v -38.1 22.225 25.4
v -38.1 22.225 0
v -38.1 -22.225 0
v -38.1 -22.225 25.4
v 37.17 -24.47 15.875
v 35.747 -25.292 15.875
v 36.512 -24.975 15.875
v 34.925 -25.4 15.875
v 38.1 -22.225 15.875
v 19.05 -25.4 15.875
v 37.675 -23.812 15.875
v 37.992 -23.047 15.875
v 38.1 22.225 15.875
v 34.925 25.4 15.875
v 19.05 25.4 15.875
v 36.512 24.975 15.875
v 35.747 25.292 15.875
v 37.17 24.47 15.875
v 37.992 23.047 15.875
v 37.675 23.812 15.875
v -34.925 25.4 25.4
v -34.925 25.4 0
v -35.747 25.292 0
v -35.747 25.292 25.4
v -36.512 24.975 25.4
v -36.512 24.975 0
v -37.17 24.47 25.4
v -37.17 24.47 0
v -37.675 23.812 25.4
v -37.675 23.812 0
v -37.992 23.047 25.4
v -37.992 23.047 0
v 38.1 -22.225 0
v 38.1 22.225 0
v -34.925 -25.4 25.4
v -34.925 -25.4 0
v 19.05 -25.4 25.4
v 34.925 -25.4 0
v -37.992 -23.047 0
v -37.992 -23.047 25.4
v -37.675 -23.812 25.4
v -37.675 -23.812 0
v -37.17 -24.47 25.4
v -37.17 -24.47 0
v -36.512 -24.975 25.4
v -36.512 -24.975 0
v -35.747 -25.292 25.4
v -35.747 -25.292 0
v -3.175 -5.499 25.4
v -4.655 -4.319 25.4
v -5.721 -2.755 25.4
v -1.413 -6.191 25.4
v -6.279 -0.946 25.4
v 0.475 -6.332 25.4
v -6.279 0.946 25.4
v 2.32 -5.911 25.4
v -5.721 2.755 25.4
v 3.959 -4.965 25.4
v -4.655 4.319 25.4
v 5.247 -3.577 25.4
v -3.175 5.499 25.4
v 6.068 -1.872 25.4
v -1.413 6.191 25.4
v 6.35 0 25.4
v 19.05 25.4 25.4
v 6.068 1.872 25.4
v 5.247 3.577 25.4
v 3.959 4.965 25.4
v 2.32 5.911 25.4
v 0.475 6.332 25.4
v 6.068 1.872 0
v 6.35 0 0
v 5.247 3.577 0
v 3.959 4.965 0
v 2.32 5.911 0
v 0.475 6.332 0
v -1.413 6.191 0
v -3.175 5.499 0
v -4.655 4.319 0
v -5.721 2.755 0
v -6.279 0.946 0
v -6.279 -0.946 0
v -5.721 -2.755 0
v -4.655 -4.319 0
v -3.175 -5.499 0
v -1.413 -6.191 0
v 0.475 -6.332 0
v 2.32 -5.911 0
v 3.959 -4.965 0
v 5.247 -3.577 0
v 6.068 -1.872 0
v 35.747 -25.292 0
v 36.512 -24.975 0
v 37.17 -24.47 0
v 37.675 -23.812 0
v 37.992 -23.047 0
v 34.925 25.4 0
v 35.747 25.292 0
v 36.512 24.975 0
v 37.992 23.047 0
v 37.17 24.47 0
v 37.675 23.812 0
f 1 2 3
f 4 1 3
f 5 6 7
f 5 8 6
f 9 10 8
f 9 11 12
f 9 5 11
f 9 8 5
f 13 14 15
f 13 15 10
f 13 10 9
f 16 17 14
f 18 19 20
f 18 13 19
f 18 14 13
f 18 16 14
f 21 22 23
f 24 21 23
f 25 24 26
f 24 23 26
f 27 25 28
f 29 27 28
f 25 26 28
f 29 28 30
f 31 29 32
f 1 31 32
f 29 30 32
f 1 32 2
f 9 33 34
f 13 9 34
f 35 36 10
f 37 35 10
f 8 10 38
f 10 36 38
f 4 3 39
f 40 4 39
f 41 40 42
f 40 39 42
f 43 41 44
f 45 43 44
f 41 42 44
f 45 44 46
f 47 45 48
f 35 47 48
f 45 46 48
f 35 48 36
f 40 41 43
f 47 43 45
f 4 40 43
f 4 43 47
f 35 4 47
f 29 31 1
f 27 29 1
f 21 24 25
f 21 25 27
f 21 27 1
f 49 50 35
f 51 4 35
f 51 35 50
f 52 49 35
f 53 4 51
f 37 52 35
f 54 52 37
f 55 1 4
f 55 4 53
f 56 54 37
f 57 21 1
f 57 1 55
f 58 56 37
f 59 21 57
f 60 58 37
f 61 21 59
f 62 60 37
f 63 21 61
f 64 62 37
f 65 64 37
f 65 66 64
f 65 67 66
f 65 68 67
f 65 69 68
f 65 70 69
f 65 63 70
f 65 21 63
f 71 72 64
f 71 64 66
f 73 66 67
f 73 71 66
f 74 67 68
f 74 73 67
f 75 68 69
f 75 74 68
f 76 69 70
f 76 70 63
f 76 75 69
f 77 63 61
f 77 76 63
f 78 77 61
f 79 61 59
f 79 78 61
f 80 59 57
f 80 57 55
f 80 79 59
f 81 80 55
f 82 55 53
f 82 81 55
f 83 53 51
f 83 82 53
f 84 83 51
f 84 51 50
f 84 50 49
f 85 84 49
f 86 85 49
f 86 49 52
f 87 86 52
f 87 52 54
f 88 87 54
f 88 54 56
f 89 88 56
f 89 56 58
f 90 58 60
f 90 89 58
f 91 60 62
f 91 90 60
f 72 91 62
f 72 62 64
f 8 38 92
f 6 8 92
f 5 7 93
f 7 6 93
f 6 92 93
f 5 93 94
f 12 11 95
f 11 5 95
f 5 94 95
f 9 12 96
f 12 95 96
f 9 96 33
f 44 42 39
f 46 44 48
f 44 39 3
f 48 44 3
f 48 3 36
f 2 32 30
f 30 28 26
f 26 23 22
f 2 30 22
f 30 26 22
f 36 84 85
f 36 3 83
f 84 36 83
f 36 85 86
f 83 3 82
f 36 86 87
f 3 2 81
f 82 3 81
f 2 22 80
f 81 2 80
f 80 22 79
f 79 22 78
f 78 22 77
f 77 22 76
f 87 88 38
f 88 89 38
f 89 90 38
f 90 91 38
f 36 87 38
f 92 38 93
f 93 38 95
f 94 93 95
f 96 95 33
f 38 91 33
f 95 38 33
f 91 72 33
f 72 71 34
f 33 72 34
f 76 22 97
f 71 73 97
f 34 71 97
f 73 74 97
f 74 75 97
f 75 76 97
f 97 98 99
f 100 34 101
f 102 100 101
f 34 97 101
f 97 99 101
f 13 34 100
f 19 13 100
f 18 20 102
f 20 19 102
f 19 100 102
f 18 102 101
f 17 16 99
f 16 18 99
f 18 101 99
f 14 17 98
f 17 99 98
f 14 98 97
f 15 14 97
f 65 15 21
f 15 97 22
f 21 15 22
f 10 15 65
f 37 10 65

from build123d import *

# Parameters (mm, degrees)
F0_R          = 6.35
F1_DEPTH      = 25.4
F2_W          = 19.05
F2_H          = 9.525
F3_DEPTH      = 25.401
F3_DEPTH_BACK = 25.401


with BuildPart() as f1:
    # F0 (on Top) → F1 (new body)
    with BuildSketch(Plane.XY):
        with BuildLine():
            Line((-34.925, -25.4), (34.925, -25.4))
            ThreePointArc((34.925, -25.4), (37.170064, -24.470064), (38.1, -22.225))
            Line((38.1, -22.225), (38.1, 22.225))
            ThreePointArc((38.1, 22.225), (37.170064, 24.470064), (34.925, 25.4))
            Line((34.925, 25.4), (-34.925, 25.4))
            ThreePointArc((-34.925, 25.4), (-37.170064, 24.470064), (-38.1, 22.225))
            Line((-38.1, 22.225), (-38.1, -22.225))
            ThreePointArc((-38.1, -22.225), (-37.170064, -24.470064), (-34.925, -25.4))
        make_face()
        Circle(F0_R, mode=Mode.SUBTRACT)
    extrude(amount=F1_DEPTH)

    # F2 (on Front) → F3 (cut, two sides)
    with BuildSketch(Plane.XZ) as f3_sk:
        with Locations((28.575, 20.6375)):
            Rectangle(F2_W, F2_H)
    extrude(amount=F3_DEPTH, mode=Mode.SUBTRACT)
    extrude(f3_sk.sketch, amount=-F3_DEPTH_BACK, mode=Mode.SUBTRACT)


solid = f1.part
